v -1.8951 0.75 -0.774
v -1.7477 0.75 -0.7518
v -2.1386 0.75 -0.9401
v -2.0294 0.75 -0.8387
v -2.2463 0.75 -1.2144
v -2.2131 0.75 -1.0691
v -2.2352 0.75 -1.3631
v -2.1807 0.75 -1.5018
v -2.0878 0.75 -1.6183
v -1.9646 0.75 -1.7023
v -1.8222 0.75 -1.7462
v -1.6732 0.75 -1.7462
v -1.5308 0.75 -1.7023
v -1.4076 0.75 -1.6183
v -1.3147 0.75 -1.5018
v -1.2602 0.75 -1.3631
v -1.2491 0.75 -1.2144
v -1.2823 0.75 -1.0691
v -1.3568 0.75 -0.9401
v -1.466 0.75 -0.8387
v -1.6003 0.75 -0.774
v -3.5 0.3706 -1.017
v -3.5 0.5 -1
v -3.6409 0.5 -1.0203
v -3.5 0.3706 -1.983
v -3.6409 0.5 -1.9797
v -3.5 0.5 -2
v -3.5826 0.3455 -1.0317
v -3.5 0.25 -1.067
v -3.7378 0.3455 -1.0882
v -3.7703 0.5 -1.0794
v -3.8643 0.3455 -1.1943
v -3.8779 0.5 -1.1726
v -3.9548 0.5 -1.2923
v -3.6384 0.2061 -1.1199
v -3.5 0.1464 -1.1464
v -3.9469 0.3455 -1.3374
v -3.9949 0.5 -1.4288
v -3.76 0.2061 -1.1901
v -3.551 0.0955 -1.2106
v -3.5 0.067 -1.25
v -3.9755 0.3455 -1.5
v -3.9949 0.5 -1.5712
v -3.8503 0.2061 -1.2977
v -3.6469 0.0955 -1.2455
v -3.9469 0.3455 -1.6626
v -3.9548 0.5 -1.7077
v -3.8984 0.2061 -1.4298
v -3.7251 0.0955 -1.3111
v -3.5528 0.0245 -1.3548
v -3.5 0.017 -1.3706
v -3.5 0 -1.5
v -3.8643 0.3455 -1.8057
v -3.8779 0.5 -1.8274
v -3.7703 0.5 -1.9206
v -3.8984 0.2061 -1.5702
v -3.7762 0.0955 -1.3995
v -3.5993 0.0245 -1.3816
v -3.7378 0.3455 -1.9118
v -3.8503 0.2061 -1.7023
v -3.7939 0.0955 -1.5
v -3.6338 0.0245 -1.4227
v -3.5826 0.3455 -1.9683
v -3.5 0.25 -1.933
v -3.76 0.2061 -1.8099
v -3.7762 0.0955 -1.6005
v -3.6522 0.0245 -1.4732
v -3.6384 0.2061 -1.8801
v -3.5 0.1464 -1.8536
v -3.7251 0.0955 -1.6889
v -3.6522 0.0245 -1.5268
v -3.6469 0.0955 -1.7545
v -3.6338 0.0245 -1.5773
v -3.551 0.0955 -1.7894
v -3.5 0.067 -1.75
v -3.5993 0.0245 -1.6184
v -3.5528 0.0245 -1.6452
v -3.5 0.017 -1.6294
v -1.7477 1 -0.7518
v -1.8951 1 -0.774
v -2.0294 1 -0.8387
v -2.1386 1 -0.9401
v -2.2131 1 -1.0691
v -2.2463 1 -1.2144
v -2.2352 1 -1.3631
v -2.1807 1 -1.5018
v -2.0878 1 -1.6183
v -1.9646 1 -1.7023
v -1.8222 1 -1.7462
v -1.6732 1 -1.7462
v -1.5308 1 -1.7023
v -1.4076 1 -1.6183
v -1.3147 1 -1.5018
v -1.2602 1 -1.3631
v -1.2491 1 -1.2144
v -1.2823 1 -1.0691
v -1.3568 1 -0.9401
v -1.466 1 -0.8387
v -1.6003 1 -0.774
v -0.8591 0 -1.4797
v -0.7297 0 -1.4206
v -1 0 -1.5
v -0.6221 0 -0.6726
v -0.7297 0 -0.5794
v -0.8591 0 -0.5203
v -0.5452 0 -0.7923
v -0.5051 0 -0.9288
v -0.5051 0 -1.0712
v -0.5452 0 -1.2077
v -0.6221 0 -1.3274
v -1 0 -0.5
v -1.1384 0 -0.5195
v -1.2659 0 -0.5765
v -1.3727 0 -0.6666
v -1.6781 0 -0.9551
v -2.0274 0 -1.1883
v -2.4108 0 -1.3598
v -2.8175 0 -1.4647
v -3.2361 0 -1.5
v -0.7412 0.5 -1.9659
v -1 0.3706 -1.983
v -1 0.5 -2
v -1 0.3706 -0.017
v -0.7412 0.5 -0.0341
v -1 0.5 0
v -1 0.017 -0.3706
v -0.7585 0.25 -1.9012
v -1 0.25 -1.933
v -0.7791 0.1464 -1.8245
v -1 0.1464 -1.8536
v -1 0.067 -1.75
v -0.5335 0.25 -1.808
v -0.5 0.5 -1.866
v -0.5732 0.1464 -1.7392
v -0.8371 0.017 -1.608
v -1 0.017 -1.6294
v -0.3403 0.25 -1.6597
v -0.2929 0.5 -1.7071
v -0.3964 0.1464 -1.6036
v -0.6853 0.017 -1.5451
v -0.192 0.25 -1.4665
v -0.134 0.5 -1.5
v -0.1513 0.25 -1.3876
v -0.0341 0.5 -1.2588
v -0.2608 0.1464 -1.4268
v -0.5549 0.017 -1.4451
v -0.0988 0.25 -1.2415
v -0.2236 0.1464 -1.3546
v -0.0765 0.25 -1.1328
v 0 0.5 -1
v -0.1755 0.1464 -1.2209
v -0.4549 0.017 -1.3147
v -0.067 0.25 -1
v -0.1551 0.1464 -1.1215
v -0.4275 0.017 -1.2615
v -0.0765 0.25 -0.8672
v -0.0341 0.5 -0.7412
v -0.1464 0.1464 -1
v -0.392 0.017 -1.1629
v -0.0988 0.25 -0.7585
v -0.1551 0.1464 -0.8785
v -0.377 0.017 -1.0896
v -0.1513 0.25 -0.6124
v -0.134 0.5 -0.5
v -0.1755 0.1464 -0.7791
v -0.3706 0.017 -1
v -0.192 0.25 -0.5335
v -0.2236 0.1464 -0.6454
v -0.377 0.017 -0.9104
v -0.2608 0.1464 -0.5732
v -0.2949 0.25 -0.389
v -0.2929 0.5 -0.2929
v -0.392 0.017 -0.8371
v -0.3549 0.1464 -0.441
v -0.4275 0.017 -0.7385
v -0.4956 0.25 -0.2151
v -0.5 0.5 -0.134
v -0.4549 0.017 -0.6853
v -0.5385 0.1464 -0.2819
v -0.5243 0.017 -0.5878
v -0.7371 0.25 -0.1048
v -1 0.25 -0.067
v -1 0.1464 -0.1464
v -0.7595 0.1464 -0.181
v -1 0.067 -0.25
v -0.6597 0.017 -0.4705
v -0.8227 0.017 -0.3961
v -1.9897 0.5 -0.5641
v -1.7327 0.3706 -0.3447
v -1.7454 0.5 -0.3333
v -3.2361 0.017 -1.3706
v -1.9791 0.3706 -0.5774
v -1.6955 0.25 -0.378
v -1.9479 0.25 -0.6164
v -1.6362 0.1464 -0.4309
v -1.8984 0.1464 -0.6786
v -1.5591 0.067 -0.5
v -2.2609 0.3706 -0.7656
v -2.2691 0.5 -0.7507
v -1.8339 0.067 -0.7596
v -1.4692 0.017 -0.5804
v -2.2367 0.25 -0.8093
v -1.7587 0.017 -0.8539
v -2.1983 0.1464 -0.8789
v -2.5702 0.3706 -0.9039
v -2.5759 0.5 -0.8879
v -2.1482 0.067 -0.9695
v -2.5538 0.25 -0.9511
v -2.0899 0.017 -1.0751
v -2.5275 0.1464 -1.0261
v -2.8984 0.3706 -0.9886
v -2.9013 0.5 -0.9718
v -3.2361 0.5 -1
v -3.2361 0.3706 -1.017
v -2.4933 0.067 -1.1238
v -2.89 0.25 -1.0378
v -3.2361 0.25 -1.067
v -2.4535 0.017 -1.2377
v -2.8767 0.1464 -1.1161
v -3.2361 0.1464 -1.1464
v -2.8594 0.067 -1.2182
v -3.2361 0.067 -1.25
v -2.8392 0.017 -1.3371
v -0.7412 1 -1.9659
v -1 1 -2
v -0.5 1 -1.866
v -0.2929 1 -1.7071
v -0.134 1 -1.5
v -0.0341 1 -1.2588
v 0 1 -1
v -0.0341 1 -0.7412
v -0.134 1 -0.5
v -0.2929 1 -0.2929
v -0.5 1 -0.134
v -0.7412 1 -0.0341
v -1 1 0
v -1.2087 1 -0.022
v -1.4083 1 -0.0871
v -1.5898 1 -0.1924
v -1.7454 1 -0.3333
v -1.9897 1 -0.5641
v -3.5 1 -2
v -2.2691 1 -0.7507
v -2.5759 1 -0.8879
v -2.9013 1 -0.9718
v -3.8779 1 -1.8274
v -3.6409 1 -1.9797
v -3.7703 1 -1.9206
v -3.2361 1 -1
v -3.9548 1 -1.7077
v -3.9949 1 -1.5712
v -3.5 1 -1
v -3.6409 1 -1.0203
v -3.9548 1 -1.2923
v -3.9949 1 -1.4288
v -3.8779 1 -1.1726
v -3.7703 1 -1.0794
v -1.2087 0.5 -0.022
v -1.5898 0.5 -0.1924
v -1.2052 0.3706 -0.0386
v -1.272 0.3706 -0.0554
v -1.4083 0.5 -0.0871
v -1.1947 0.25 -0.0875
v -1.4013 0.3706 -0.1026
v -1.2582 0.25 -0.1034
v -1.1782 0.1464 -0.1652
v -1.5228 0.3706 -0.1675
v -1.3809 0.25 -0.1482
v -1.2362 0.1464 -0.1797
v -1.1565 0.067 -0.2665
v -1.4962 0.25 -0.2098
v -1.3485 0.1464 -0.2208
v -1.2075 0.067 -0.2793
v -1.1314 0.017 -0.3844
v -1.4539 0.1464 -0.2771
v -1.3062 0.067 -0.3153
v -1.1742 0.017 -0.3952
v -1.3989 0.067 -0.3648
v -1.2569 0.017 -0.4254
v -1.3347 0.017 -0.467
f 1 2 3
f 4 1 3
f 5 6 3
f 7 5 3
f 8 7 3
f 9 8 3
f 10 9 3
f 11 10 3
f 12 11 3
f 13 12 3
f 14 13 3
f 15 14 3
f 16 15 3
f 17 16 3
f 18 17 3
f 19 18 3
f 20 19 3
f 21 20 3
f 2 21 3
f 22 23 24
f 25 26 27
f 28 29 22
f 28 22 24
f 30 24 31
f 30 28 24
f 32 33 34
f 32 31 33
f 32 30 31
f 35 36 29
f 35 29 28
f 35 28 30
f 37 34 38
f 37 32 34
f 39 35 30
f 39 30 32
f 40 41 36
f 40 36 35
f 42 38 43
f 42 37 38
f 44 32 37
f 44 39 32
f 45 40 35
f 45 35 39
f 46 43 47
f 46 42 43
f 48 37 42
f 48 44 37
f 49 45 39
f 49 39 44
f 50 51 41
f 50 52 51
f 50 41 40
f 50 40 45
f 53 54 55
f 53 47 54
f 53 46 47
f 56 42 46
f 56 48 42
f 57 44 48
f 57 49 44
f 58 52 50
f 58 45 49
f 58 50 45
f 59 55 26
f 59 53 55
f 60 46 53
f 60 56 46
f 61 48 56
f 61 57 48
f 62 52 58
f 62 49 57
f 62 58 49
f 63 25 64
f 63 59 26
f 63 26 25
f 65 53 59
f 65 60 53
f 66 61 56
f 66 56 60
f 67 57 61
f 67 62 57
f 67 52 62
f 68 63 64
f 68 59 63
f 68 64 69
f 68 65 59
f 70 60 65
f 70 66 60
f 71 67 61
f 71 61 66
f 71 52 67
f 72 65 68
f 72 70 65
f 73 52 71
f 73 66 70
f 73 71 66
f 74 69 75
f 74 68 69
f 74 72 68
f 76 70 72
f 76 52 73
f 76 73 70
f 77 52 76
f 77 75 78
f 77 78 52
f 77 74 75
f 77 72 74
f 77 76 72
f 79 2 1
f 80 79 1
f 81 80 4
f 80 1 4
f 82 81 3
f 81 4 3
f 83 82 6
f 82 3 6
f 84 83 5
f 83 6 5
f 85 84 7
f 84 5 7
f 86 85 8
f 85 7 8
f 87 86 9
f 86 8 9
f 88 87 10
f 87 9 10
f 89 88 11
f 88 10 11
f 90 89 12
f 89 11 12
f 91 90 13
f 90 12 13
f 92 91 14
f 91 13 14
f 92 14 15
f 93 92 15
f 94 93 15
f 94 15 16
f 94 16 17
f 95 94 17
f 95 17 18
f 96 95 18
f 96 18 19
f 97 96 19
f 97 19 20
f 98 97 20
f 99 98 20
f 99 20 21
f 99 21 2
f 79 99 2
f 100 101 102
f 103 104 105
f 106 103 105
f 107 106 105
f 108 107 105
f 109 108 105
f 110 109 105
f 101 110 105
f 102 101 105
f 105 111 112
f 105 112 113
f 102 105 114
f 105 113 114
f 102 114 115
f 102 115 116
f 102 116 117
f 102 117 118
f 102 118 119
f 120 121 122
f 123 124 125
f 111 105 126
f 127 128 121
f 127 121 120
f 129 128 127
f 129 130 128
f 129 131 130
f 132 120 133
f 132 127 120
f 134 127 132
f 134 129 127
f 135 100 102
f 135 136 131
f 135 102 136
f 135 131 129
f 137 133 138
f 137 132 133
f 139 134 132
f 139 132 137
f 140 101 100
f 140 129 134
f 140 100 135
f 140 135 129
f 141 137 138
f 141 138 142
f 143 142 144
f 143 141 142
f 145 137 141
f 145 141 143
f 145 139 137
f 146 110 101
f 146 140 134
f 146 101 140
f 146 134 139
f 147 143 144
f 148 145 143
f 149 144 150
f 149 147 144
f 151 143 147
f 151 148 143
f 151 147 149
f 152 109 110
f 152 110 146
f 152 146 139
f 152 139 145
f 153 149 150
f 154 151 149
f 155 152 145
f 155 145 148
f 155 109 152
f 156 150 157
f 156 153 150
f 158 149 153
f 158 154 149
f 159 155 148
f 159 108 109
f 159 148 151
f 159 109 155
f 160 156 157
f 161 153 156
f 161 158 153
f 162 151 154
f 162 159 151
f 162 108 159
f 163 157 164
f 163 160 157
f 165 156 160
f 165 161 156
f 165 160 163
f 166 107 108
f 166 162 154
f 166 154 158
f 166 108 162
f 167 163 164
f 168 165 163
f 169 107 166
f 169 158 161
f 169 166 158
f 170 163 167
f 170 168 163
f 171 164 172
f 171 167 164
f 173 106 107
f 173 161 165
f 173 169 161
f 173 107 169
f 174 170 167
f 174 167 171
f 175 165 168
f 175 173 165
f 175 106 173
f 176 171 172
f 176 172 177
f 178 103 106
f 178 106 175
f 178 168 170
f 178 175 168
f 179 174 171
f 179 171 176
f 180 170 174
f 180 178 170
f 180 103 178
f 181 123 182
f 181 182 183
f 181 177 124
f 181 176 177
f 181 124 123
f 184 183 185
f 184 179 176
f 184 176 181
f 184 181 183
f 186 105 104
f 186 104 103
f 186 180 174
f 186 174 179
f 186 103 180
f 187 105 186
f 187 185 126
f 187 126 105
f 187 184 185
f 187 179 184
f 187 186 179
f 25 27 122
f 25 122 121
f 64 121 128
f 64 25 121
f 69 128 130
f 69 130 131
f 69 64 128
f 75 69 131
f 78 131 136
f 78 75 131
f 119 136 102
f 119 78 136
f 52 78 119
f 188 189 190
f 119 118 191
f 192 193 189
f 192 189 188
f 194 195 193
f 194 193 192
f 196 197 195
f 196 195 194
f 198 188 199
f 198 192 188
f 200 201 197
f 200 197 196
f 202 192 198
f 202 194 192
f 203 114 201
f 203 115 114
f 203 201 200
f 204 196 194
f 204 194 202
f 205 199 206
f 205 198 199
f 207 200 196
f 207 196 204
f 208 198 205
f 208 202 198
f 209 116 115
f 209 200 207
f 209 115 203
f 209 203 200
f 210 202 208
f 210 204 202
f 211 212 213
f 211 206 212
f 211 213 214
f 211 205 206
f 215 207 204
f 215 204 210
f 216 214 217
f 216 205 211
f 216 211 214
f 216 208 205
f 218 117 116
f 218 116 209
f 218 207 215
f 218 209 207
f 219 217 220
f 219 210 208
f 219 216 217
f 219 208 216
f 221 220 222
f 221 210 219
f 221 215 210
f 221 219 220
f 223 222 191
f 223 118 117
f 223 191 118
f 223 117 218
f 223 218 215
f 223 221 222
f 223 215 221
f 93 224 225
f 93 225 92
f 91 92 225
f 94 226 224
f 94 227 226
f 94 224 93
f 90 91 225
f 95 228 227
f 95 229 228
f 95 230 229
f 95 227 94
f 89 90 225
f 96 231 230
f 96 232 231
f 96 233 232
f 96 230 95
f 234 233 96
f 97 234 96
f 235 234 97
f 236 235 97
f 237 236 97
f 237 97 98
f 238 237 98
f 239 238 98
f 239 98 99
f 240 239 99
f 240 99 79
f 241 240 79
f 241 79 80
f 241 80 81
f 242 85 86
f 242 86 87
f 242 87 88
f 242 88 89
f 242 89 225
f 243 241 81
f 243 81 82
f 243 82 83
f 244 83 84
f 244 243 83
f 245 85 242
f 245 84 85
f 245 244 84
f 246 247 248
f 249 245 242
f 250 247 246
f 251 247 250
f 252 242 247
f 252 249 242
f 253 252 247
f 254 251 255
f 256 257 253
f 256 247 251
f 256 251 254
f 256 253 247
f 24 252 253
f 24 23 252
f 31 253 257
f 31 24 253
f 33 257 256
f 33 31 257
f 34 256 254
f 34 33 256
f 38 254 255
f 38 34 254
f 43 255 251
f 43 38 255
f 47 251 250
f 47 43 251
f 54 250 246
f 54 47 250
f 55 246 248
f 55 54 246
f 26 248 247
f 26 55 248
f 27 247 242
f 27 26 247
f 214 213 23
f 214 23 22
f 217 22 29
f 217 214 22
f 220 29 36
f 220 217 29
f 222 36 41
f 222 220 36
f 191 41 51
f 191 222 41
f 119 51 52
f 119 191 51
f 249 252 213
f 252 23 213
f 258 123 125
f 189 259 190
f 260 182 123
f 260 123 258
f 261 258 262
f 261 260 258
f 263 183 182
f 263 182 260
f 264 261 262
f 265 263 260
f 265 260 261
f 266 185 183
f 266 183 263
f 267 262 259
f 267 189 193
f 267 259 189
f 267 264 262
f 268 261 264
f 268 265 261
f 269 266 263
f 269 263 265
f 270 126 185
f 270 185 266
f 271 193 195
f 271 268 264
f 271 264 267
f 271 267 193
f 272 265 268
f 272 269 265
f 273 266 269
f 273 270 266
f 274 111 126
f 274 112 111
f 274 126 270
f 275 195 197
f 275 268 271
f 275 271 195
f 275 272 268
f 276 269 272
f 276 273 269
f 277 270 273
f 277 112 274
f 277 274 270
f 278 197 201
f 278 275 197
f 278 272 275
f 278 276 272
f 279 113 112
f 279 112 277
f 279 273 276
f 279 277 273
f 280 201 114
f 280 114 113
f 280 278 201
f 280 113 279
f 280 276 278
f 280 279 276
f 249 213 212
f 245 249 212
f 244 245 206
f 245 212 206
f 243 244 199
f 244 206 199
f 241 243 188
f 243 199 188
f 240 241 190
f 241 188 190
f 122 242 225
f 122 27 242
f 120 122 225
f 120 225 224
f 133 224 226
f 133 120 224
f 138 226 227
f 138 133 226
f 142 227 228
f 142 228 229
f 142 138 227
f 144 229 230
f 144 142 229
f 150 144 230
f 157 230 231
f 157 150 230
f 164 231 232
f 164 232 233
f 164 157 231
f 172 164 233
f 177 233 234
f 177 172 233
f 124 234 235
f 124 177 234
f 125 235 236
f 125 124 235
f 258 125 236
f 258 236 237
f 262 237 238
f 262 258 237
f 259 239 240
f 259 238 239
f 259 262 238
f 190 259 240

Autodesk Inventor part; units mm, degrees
ref_plane "YZ Plane" through (0, 0, 0) normal (1, 0, 0) x (0, 1, 0)
ref_plane "XZ Plane" through (0, 0, 0) normal (0, 1, 0) x (-1, 0, 0)
ref_plane "XY Plane" through (0, 0, 0) normal (0, 0, 1) x (1, 0, 0)
sketch "Sketch1" plane through (0, 0, 0) normal (0, 1, 0) x (-1, 0, 0)
  line L0 (1, 0) -> (4, 0) construction
  line L1 (4, 0) -> (4, -1.5) construction
  line L2 (3.5, -2) -> (1, -2)
  line L3 (0, -1) -> (0, -1)
  arc A0 (1, 0) -> (0, -1) centre (1, -1) ccw
  arc A1 (0, -1) -> (1, -2) centre (1, -1) ccw
  arc A2 (3.5, -2) -> (4, -1.5) centre (3.5, -1.5) ccw
  arc A3 (1.7454, -0.3333) -> (1, -2) centre (1, -1) ccw
  arc A4 (3.5, -2) -> (3.5, -1) centre (3.5, -1.5) ccw
  line L4 (3.5, -1) -> (3.2361, -1)
  arc A5 (1.7454, -0.3333) -> (3.2361, -1) centre (3.2361, 1) ccw
  point P0 (0, 0)
  point P1 (4, -2)
  point P2 (0, -2)
  point P3 (2, -1)
  dimension "d0" = 4
  dimension "d1" = 2
  dimension "d2" = 1
  dimension "d3" = 0.5
  dimension "d4" = 2
extrude "Extrusion1" add sketch "Sketch1" along normal blind 1
sketch "Sketch2" plane through (0, 1, 0) normal (0, 1, 0) x (1, 0, 0)
  circle A0 centre (-1.7477, 1.2518) radius 0.5
  point P0 (0, 0)
  dimension "d7" = 1
hole "Hole1" at (-1.7477, 1, -1.2518) direction (0, -1, 0) diameter 1 depth 0.25
fillet "Fillet2" radius 0.5 5 edges at (-0.0871, 0, -0.5918) (-2.25, 0, -2) (-4, 0, -1.5) (-3.368, 0, -1) (-2.4196, 0, -0.8257)
properties part number "cauciuc ochelari" material "Rubber, Silicone"
